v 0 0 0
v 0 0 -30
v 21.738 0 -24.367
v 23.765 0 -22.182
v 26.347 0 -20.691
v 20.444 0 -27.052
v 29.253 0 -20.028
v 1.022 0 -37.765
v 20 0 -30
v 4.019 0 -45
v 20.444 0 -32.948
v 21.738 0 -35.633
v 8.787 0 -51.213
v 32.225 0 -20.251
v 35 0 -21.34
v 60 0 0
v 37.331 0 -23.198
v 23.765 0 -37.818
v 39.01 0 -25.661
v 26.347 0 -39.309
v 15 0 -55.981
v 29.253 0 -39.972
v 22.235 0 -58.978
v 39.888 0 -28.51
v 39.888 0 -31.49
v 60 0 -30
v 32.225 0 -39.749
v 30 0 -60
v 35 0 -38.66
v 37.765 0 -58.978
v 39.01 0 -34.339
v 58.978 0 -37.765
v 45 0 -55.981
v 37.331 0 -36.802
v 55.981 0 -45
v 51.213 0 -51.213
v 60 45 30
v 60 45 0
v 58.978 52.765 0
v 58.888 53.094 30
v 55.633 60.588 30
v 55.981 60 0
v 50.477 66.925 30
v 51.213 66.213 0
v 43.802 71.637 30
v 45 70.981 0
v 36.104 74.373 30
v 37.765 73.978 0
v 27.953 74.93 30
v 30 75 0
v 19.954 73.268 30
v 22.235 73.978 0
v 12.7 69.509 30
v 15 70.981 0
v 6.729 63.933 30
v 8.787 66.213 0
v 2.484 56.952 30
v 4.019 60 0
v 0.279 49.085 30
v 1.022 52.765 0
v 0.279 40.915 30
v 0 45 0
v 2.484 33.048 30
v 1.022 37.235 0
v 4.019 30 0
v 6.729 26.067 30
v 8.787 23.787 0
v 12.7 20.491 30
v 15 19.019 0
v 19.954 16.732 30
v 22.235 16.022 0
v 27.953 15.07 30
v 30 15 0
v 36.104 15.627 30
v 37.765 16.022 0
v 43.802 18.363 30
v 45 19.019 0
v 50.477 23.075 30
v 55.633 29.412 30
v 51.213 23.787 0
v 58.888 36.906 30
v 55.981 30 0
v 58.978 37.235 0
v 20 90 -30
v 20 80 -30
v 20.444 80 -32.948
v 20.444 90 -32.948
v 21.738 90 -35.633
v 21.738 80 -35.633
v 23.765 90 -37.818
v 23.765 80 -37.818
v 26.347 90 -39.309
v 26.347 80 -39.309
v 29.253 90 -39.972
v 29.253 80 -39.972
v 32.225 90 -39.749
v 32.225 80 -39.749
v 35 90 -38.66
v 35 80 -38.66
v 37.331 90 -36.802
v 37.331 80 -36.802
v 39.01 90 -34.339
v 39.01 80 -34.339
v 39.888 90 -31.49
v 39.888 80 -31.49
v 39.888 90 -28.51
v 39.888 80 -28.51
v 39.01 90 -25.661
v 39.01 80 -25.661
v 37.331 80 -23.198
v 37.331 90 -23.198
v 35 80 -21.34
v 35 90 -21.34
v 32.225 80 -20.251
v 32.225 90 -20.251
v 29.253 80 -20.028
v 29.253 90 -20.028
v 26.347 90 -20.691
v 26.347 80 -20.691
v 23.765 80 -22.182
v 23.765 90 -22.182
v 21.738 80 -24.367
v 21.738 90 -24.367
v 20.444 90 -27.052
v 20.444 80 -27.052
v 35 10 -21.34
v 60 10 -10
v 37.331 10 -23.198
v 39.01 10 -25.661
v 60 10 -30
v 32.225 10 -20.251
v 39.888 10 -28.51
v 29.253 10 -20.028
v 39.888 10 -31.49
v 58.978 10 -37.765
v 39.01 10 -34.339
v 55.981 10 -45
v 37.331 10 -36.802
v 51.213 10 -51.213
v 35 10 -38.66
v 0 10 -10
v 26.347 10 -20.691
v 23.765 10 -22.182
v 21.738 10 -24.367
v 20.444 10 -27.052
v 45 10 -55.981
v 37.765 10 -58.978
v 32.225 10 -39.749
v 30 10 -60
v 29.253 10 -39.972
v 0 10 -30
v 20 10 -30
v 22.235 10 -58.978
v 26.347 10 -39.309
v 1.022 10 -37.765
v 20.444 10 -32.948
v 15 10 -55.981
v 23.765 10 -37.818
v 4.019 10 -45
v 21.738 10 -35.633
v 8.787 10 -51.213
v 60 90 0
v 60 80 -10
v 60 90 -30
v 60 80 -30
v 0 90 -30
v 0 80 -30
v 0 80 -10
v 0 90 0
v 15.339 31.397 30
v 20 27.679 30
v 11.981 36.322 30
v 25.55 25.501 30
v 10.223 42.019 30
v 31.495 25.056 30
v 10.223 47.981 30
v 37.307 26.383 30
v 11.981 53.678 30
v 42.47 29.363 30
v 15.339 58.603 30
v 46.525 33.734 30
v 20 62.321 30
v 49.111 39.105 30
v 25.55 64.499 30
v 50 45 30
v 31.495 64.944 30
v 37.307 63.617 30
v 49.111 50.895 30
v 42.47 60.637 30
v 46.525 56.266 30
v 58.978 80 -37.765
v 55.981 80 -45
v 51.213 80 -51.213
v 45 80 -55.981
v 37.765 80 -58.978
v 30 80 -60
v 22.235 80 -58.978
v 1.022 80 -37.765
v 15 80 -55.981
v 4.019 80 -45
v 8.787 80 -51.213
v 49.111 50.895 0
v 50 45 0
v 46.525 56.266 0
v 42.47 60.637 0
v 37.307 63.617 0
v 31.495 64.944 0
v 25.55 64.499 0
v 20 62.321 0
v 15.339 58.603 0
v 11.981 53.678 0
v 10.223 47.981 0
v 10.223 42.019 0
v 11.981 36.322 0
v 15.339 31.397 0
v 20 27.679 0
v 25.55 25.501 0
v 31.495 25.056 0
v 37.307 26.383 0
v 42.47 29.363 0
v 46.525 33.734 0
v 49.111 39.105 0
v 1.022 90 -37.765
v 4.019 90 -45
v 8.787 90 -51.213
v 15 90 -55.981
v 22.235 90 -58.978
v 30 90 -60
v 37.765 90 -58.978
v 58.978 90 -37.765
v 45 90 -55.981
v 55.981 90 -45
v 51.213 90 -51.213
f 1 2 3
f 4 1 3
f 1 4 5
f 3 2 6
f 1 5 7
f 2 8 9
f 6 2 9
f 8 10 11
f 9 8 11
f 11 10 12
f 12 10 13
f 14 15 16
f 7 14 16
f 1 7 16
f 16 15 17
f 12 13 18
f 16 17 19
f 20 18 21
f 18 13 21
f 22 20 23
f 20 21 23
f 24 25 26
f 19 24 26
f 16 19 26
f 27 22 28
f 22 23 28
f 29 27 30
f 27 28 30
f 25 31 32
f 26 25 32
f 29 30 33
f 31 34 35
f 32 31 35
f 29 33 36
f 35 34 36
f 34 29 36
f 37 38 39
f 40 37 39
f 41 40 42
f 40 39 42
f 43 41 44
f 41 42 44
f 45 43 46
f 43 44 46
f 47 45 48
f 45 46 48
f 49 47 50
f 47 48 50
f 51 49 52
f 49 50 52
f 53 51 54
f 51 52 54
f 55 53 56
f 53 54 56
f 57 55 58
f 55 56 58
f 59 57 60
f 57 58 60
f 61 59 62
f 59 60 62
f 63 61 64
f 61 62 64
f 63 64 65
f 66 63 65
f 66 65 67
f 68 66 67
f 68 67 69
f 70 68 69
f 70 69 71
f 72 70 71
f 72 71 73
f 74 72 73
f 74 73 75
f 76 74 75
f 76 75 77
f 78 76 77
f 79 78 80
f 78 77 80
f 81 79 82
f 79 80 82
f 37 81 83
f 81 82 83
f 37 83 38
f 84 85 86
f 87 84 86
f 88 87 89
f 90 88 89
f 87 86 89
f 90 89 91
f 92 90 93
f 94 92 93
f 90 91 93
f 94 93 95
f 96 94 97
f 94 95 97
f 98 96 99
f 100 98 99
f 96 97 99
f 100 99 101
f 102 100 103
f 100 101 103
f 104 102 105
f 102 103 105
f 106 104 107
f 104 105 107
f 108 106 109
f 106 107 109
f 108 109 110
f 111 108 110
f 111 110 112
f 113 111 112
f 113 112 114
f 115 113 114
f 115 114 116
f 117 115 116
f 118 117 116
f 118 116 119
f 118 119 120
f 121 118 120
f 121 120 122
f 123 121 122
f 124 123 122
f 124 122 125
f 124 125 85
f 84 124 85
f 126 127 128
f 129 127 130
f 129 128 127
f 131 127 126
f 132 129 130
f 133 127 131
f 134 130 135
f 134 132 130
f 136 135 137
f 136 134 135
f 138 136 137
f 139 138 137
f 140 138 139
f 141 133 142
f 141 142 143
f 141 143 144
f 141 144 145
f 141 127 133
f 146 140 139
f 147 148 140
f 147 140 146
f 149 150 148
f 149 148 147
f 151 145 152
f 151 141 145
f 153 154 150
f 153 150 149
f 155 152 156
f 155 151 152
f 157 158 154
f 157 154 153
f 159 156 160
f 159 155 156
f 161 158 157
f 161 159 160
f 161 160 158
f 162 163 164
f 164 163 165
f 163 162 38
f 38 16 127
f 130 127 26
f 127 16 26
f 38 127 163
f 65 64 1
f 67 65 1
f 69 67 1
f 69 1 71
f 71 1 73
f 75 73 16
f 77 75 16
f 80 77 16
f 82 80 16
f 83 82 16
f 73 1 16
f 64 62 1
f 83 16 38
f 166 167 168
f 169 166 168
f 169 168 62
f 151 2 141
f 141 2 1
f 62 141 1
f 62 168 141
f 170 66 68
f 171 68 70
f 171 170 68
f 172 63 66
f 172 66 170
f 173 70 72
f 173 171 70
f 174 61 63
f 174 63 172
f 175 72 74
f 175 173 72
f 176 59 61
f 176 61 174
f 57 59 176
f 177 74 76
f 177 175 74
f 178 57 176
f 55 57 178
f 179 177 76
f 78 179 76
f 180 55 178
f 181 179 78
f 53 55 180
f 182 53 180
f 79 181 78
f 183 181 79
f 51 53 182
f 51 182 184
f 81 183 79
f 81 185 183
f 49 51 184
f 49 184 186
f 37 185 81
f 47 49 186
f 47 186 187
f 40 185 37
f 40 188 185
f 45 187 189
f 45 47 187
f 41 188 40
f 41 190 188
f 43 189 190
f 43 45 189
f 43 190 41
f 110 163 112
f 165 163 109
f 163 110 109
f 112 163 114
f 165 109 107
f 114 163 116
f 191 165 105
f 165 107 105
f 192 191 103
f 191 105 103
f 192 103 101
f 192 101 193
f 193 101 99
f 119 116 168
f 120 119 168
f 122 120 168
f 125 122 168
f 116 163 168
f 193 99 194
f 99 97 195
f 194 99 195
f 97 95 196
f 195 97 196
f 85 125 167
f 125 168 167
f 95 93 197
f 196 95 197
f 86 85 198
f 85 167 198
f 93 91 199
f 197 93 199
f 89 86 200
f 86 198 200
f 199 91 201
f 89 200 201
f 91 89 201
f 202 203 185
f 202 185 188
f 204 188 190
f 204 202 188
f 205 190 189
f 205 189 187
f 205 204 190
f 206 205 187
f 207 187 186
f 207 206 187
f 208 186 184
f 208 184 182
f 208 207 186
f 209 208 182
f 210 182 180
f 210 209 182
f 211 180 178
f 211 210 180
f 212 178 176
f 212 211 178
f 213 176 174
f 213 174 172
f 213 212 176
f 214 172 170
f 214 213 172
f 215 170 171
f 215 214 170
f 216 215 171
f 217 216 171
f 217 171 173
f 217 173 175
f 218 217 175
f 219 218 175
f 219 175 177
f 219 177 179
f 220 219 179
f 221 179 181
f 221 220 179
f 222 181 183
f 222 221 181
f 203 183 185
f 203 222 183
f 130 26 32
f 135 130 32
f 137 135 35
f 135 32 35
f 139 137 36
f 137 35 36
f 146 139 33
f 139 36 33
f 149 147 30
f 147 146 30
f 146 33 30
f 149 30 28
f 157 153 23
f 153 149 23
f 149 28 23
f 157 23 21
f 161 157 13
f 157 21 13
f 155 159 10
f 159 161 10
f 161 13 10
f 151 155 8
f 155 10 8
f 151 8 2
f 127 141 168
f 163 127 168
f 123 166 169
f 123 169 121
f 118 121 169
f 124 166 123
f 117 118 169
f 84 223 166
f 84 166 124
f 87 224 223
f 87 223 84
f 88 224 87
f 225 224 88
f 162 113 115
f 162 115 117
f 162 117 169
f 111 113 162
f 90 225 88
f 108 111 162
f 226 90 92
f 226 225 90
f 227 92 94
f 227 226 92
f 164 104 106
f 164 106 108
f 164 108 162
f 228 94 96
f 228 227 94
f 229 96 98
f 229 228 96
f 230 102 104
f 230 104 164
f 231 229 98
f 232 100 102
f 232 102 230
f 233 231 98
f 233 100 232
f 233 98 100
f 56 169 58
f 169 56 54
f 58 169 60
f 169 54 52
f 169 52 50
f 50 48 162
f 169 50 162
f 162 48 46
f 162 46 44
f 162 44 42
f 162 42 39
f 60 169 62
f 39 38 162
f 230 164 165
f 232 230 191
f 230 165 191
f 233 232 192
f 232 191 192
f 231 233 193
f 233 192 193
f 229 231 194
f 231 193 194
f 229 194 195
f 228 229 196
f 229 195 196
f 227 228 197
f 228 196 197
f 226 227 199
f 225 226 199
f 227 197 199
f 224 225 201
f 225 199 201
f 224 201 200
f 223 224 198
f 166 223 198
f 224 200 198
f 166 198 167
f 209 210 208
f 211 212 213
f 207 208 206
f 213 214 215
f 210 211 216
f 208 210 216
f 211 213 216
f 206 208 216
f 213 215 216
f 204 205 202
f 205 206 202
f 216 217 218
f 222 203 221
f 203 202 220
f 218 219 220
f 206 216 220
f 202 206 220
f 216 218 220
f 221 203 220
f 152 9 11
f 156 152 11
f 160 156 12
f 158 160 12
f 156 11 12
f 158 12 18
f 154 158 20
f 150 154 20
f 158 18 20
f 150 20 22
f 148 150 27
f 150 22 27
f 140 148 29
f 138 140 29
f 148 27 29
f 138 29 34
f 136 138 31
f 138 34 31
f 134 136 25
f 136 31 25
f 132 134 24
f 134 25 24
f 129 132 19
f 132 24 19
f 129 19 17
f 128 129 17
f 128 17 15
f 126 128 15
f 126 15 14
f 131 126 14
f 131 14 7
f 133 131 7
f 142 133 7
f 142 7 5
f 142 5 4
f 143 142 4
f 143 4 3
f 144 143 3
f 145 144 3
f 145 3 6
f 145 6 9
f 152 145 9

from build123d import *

# Parameters (mm, degrees)
BOSS_EXTRUDE4_DEPTH     = 90
CUT_EXTRUDE1_DEPTH      = 69
CUT_EXTRUDE1_DEPTH_BACK = 18
SKETCH7_W               = 55.395667886
SKETCH7_H               = 70
SKETCH8_R               = 30
SKETCH8_R_2             = 20
BOSS_EXTRUDE5_DEPTH     = 30


with BuildPart() as part:
    # Sketch5 → Boss-Extrude4 (new body)
    with BuildSketch(Plane(origin=(0, 0, 0), x_dir=(1, 0, 0), z_dir=(0, 1, 0))):
        with BuildLine():
            Line((0, 30), (0, 0))
            Line((0, 0), (60, 0))
            Line((60, 0), (60, 30))
            Line((60, 30), (40, 30))
            ThreePointArc((40, 30), (30, 20), (20, 30))
            Line((20, 30), (0, 30))
        make_face()
        with BuildLine():
            ThreePointArc((60, 30), (30, 60), (0, 30))
            Line((0, 30), (20, 30))
            ThreePointArc((20, 30), (30, 40), (40, 30))
            Line((40, 30), (60, 30))
        make_face()
    extrude(amount=BOSS_EXTRUDE4_DEPTH)

    # Sketch7 → Cut-Extrude1 (cut, two sides: drawn at the far end of the back side and taken through both)
    with BuildSketch(Plane(origin=(0, 0, 0), x_dir=(0, 0, -1), z_dir=(1, 0, 0)).offset(-CUT_EXTRUDE1_DEPTH_BACK)):
        with Locations((37.697833943, 45)):
            Rectangle(SKETCH7_W, SKETCH7_H)
    extrude(amount=CUT_EXTRUDE1_DEPTH + CUT_EXTRUDE1_DEPTH_BACK, mode=Mode.SUBTRACT)

    # Sketch8 → Boss-Extrude5 (add)
    with BuildSketch(Plane.XY):
        with Locations((30, 45)):
            Circle(SKETCH8_R)
        with Locations((30, 45)):
            Circle(SKETCH8_R_2, mode=Mode.SUBTRACT)
    extrude(amount=BOSS_EXTRUDE5_DEPTH)


solid = part.part
